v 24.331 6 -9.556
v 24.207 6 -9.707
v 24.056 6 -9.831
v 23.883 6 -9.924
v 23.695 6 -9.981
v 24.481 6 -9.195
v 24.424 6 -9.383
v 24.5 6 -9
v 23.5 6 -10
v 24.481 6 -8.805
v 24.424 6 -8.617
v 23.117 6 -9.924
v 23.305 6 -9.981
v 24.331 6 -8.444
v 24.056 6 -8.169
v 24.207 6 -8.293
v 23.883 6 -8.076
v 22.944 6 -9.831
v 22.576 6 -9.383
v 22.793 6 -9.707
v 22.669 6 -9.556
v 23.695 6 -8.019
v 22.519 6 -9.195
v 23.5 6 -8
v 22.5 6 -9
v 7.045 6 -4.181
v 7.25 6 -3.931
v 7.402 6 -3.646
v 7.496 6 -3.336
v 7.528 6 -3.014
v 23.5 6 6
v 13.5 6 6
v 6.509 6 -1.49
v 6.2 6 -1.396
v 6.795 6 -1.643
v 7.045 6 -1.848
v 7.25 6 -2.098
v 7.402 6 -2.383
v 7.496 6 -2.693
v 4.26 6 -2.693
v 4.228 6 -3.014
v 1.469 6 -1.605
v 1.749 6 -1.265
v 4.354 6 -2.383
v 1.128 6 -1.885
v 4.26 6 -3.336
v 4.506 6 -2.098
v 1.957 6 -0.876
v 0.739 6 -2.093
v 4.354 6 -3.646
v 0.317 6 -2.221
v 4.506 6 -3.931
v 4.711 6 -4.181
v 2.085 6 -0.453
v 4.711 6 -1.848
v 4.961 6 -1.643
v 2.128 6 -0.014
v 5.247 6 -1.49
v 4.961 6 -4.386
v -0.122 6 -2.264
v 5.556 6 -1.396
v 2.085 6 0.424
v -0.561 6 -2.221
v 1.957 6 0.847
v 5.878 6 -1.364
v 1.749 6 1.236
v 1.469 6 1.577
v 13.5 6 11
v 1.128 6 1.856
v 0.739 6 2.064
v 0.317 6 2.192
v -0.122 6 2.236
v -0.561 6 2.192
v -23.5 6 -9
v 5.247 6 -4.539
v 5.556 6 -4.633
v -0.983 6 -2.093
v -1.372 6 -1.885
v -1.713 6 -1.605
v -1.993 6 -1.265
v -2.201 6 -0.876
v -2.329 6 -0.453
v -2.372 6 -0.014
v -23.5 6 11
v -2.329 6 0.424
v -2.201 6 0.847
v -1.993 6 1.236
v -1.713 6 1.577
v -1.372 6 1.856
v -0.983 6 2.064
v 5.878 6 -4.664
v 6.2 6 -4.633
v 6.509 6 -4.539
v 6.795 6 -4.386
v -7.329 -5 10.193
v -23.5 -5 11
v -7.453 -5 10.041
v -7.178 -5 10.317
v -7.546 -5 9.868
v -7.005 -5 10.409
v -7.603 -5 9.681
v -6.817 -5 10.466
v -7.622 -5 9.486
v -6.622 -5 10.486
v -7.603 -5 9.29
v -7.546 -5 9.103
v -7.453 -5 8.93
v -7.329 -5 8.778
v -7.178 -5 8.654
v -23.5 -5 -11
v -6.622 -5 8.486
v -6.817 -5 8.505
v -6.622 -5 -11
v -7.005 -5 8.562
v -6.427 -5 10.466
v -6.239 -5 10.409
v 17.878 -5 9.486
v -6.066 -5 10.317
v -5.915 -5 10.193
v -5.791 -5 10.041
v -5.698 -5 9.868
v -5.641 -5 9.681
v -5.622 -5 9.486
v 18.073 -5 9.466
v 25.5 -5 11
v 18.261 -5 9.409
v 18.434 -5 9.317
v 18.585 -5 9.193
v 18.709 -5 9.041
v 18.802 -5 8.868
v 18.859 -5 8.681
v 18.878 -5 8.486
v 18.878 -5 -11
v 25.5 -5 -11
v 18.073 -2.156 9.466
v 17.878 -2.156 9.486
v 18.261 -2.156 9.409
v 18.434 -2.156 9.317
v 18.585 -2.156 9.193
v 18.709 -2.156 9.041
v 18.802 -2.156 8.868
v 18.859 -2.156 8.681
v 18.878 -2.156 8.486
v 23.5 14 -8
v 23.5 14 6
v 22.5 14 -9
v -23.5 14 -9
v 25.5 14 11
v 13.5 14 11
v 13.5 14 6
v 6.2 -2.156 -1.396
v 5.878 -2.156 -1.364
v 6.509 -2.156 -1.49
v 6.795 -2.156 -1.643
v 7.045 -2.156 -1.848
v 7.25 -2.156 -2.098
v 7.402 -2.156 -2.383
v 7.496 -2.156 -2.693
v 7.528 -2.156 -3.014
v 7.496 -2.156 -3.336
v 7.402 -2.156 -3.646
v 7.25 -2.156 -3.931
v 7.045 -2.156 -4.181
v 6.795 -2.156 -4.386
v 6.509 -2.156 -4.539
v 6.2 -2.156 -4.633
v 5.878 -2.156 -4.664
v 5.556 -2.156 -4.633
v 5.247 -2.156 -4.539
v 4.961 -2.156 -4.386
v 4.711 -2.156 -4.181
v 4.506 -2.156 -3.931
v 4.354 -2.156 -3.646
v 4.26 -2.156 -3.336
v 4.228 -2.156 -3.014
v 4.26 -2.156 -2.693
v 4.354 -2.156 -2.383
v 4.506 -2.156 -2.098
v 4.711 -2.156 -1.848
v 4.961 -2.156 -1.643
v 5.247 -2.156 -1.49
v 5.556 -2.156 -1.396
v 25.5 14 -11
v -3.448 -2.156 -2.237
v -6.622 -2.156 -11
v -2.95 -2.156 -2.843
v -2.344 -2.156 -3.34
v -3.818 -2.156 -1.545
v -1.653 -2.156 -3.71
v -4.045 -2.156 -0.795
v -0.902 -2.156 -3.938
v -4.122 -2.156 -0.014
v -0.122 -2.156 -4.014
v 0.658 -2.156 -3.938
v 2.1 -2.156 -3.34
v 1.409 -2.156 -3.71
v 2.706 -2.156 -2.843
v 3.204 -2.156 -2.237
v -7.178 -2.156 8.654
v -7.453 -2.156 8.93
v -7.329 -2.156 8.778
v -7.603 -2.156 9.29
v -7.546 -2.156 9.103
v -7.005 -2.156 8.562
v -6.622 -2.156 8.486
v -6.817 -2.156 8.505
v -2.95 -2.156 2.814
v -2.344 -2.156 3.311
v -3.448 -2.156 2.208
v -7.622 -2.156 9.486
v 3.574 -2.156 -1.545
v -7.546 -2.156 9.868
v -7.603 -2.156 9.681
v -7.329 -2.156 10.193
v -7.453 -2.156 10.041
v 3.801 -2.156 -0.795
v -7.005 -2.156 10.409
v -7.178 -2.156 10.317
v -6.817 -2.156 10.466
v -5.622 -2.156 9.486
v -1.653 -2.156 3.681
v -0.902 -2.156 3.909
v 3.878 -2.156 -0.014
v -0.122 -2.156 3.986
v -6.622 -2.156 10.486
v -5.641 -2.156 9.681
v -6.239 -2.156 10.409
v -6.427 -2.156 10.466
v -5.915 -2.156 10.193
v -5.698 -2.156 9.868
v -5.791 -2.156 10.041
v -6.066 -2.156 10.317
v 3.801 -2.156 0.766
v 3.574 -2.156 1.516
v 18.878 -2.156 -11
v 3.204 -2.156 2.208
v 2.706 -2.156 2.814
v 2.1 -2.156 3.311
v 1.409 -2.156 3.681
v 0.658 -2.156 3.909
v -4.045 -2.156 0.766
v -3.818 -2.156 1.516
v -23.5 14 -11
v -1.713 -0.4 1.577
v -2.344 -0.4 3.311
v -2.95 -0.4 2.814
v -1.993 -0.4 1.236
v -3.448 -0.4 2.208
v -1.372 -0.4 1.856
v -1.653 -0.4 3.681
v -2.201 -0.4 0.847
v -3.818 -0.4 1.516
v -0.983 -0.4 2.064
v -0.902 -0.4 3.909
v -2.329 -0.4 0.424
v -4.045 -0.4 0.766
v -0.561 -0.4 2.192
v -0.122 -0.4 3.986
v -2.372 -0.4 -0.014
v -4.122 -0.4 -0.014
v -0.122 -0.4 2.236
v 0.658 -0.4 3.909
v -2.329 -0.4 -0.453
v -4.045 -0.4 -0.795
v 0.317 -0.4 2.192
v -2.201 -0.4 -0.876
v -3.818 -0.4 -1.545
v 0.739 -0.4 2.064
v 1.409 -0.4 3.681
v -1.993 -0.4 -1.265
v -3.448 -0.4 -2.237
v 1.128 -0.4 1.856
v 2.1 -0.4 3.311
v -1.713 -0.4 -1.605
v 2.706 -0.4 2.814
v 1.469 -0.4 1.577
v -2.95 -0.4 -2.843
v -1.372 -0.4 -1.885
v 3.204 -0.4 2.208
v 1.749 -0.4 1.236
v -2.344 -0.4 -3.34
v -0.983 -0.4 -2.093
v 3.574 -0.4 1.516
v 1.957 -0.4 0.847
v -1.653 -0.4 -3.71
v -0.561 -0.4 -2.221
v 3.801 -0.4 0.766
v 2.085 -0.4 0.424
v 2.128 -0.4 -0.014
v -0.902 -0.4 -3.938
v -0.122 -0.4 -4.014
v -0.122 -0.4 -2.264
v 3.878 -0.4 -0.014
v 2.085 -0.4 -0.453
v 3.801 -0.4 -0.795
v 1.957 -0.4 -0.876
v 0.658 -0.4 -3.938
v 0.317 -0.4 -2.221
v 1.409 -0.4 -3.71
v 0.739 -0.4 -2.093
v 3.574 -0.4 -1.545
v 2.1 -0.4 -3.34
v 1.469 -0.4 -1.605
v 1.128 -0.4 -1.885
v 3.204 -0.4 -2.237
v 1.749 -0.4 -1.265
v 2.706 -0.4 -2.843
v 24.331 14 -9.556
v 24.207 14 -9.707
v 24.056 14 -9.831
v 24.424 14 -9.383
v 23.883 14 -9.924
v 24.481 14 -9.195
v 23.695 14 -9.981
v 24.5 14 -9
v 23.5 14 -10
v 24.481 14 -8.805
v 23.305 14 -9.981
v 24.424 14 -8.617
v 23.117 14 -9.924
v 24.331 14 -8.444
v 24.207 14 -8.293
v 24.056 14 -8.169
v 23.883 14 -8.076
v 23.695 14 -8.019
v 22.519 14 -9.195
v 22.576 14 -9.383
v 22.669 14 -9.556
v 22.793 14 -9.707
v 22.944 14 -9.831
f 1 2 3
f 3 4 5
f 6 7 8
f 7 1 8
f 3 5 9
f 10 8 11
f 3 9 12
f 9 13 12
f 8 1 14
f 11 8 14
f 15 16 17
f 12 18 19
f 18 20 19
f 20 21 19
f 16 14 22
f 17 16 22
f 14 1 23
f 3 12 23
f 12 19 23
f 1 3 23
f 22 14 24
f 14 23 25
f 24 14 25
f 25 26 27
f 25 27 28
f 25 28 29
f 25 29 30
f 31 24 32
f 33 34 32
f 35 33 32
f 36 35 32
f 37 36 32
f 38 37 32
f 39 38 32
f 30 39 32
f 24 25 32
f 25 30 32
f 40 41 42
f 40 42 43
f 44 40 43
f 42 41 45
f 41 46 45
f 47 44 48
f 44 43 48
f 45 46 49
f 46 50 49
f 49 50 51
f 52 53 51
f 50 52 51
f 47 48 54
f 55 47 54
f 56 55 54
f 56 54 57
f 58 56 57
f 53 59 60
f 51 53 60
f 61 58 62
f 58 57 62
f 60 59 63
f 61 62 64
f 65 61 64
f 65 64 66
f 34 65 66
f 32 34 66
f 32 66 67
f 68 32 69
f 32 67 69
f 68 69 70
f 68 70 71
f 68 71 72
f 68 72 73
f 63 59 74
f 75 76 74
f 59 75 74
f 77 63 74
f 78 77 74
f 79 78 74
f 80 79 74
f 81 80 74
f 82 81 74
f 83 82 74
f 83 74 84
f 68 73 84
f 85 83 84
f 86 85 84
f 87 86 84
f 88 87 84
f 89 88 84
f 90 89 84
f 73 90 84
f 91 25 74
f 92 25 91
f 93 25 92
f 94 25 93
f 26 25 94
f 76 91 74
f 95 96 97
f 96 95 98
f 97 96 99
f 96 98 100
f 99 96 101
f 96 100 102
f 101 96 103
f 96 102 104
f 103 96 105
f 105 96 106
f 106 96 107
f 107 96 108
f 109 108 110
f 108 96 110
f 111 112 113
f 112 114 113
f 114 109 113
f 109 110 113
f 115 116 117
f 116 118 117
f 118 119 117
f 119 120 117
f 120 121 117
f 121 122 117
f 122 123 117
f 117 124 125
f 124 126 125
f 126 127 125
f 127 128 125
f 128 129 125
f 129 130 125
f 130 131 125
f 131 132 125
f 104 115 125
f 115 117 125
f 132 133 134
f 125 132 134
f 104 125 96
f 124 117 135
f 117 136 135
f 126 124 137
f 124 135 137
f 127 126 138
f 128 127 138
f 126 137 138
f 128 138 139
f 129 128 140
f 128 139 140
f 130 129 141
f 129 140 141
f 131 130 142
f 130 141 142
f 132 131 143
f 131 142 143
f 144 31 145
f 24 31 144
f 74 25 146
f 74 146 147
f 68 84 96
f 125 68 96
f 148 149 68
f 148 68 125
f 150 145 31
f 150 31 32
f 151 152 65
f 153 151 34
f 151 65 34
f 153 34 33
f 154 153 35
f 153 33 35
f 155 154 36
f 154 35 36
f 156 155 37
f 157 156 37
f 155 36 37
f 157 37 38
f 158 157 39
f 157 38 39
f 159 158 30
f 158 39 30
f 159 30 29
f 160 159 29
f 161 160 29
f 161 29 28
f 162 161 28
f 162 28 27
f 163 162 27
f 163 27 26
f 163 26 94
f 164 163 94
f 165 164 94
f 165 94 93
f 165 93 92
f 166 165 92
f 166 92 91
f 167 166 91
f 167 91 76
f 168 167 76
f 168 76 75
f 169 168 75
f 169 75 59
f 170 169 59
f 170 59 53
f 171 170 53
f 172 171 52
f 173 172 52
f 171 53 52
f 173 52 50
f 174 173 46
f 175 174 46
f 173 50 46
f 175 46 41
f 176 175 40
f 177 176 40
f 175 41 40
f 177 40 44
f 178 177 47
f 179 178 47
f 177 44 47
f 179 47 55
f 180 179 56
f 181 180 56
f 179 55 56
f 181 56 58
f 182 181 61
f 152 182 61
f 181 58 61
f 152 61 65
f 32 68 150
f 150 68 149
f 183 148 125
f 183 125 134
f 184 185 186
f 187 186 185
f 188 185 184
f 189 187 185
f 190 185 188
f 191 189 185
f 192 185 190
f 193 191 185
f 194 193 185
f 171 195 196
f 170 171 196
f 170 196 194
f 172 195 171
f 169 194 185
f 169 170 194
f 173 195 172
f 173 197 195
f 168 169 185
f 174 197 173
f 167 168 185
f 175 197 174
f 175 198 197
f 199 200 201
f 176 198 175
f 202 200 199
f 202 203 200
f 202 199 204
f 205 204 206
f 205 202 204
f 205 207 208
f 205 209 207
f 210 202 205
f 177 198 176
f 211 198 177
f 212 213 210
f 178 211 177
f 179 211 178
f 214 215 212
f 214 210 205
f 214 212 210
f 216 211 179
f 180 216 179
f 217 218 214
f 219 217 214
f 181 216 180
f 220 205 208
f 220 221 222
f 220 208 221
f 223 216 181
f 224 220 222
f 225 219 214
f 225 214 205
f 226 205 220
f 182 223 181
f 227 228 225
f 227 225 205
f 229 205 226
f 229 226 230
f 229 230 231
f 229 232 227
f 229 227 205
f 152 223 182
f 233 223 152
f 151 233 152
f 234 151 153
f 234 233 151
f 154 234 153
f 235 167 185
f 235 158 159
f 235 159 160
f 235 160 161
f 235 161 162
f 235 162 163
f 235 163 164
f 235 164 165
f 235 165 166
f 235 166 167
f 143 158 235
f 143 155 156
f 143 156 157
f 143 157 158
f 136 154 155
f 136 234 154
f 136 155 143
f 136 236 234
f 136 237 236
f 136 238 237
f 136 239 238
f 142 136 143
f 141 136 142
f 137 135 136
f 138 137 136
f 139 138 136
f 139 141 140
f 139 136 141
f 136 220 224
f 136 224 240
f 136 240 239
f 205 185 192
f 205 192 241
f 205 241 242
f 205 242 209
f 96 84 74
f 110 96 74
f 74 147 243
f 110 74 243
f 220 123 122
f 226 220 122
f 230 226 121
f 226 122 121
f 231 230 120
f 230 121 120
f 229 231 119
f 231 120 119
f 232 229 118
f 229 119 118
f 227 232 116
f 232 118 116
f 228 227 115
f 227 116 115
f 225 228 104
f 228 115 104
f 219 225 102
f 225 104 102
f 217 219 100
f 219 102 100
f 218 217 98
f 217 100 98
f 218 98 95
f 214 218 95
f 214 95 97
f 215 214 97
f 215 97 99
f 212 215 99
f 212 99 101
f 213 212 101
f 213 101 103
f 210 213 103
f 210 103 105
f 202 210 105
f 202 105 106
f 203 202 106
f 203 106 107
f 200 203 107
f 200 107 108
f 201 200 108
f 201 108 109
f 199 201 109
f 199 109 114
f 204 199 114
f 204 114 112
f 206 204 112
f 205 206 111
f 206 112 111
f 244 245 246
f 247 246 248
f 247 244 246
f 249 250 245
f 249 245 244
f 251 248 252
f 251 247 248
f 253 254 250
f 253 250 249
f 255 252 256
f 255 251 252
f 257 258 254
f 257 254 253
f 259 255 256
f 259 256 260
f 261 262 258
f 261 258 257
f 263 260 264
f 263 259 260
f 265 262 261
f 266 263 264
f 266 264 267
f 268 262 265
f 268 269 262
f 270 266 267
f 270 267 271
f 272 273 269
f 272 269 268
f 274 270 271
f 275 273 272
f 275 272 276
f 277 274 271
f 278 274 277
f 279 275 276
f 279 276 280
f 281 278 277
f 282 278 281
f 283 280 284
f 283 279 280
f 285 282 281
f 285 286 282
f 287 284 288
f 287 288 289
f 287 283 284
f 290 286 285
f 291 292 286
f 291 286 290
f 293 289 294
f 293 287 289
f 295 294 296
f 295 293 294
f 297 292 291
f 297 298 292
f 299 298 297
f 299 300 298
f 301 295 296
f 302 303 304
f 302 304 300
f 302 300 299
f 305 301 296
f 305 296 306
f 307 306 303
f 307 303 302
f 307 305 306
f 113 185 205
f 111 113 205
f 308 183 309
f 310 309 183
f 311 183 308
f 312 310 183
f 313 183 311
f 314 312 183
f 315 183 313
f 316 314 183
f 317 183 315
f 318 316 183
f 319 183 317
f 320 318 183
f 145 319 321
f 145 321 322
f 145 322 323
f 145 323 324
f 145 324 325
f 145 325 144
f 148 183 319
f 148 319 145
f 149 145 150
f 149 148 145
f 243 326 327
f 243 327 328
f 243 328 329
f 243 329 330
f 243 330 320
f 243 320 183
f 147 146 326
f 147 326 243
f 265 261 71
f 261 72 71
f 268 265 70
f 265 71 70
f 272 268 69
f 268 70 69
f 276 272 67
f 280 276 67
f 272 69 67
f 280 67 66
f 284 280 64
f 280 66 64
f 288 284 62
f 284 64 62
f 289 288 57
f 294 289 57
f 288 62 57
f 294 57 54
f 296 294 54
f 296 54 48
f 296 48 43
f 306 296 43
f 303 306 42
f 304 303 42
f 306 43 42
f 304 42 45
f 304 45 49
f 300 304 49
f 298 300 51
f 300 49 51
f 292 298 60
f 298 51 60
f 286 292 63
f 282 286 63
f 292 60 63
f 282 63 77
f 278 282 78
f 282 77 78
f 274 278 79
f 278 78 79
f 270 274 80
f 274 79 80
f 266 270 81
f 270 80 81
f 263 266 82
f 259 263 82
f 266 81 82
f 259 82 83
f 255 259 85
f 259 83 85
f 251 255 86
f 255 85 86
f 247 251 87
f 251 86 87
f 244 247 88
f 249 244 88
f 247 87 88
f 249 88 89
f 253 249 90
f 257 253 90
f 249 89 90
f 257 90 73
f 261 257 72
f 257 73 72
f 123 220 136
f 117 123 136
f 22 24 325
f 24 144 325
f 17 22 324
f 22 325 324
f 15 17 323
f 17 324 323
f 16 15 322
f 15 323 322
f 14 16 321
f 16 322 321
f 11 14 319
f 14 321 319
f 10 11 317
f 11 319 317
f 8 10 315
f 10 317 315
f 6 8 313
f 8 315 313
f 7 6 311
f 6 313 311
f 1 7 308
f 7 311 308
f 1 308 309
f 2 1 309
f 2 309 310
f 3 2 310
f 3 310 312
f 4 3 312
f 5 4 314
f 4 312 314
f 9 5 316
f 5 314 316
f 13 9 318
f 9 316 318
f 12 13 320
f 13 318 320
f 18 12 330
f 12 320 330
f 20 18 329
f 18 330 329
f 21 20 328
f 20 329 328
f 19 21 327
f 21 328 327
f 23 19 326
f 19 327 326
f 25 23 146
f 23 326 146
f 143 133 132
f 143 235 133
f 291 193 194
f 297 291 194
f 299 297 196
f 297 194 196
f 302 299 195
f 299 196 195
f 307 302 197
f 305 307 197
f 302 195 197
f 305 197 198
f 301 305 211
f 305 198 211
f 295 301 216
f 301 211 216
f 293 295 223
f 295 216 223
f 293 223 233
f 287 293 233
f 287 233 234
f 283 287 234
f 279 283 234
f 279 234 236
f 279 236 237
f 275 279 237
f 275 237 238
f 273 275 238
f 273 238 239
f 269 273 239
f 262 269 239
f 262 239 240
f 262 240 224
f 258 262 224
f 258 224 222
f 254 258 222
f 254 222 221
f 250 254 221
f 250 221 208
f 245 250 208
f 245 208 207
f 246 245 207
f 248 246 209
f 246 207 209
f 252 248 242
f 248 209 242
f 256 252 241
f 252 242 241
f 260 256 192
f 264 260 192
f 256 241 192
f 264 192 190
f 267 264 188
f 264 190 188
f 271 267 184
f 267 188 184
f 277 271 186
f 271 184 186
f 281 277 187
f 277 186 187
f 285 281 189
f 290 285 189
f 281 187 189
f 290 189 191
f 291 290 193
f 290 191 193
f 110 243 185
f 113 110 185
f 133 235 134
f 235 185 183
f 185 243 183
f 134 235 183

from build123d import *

# Parameters (mm, degrees)
SKETCH_1_W                = 47
SKETCH_1_H                = 18
EXTRUDE_1_DEPTH           = 6
EXTRUDE_2_DEPTH           = 8
EXTRUDE_2_DEPTH_BACK      = 6
SKETCH_15_W               = 49
SKETCH_15_H               = 22
EXTRUDE_3_DEPTH           = 5
SKETCH_12_W               = 2
SKETCH_12_H               = 8
CUT_EXTRUDE_5_DEPTH       = 37
SKETCH_19_W               = 10
SKETCH_19_H               = 8
EXTRUDE_4_DEPTH           = 3
SKETCH_13_R               = 1
CUT_EXTRUDE_6_DEPTH       = 8
CUT_EXTRUDE_START         = -2.844
SKETCH_5_W                = 25
SKETCH_5_H                = 25
CUT_EXTRUDE_1_DEPTH       = 2.844
HOLE_WIZARD_2_D           = 4.5
HOLE_WIZARD_2_CBORE_D     = 8
HOLE_WIZARD_2_CBORE_DEPTH = 4.6
HOLE_WIZARD_M4_4_D        = 3.3
SKETCH_17_W               = 20.485510756
SKETCH_17_H               = 2.844
CUT_EXTRUDE_8_DEPTH       = 0.5
SKETCH_18_R               = 1
CUT_EXTRUDE_9_DEPTH       = 2.844
FILLET_1_R                = 1


with BuildPart() as part:
    # 草图1 → 凸台-拉伸1 (new body)
    with BuildSketch(Plane(origin=(0, 0, 0), x_dir=(1, 0, 0), z_dir=(0, 1, 0))):
        Rectangle(SKETCH_1_W, SKETCH_1_H)
    extrude(amount=EXTRUDE_1_DEPTH)

    # 草图2 → 凸台-拉伸2 (add, two sides: drawn at the far end of the back side and taken through both)
    with BuildSketch(Plane(origin=(0, 6, 0), x_dir=(1, 0, 0), z_dir=(0, 1, 0)).offset(-EXTRUDE_2_DEPTH_BACK)):
        Polygon((23.5, 9), (-23.5, 9), (-23.5, 11), (25.5, 11), (25.5, -11), (-23.5, -11), (-23.5, -9), (23.5, -9), align=None)
    extrude(amount=EXTRUDE_2_DEPTH + EXTRUDE_2_DEPTH_BACK)

    # 草图15 → 凸台-拉伸3 (add)
    with BuildSketch(Plane(origin=(0, 0, 10), x_dir=(1, 0, 0), z_dir=(0, 1, 0))):
        with Locations((1, 10)):
            Rectangle(SKETCH_15_W, SKETCH_15_H)
    extrude(amount=-EXTRUDE_3_DEPTH)

    # 草图12 → 切除-拉伸5 (cut)
    with BuildSketch(Plane.ZY.offset(23.5)):
        with Locations((10, 10)):
            Rectangle(SKETCH_12_W, SKETCH_12_H)
    extrude(amount=-CUT_EXTRUDE_5_DEPTH, mode=Mode.SUBTRACT)

    # 草图19 → 凸台-拉伸4 (add)
    with BuildSketch(Plane(origin=(0, 0, 9), x_dir=(-1, 0, 0), z_dir=(0, 0, -1))):
        with Locations((-18.5, 10)):
            Rectangle(SKETCH_19_W, SKETCH_19_H)
    extrude(amount=EXTRUDE_4_DEPTH)

    # 草图13 → 切除-拉伸6 (cut)
    with BuildSketch(Plane(origin=(0, 14, 0), x_dir=(1, 0, 0), z_dir=(0, 1, 0))):
        with Locations((23.5, 9)):
            Circle(SKETCH_13_R)
    extrude(amount=-CUT_EXTRUDE_6_DEPTH, mode=Mode.SUBTRACT)

    # 草图5 → 切除-拉伸1 (cut)
    with BuildSketch(Plane.XZ.offset(5).offset(CUT_EXTRUDE_START)):
        with Locations((5.878, -3.014489244)):
            Rectangle(SKETCH_5_W, SKETCH_5_H)
    extrude(amount=CUT_EXTRUDE_1_DEPTH, mode=Mode.SUBTRACT)

    # 打孔尺寸(%根据)内六角圆柱头螺钉的类型2 (through all)
    with Locations(Plane(origin=(-0.122, -5, -0.014489244), x_dir=(0, 0, -1), z_dir=(0, -1, 0))):
        with Locations((0, 0)):
            CounterBoreHole(HOLE_WIZARD_2_D / 2, HOLE_WIZARD_2_CBORE_D / 2, HOLE_WIZARD_2_CBORE_DEPTH)

    # M4 螺纹孔4 (through all)
    with Locations(Plane(origin=(5.878, -2.156, -3.014489244), x_dir=(0, 0, -1), z_dir=(0, -1, 0))):
        with Locations((0, 0)):
            Hole(HOLE_WIZARD_M4_4_D / 2)

    # 草图17 → 切除-拉伸8 (cut)
    with BuildSketch(Plane.ZY.offset(-18.378)):
        with Locations((-0.757244622, -3.578)):
            Rectangle(SKETCH_17_W, SKETCH_17_H)
    extrude(amount=-CUT_EXTRUDE_8_DEPTH, mode=Mode.SUBTRACT)

    # 草图18 → 切除-拉伸9 (cut)
    with BuildSketch(Plane(origin=(0, -5, 0), x_dir=(-1, 0, 0), z_dir=(0, -1, 0))):
        with Locations((6.622, -9.485510756)):
            Circle(SKETCH_18_R)
    extrude(amount=-CUT_EXTRUDE_9_DEPTH, mode=Mode.SUBTRACT)

    # 圆角1
    fillet_1_edges = [part.edges().sort_by_distance(p)[0] for p in [
        (18.878, -3.578, 9.485510756),
    ]]
    fillet(fillet_1_edges, radius=FILLET_1_R)


solid = part.part
